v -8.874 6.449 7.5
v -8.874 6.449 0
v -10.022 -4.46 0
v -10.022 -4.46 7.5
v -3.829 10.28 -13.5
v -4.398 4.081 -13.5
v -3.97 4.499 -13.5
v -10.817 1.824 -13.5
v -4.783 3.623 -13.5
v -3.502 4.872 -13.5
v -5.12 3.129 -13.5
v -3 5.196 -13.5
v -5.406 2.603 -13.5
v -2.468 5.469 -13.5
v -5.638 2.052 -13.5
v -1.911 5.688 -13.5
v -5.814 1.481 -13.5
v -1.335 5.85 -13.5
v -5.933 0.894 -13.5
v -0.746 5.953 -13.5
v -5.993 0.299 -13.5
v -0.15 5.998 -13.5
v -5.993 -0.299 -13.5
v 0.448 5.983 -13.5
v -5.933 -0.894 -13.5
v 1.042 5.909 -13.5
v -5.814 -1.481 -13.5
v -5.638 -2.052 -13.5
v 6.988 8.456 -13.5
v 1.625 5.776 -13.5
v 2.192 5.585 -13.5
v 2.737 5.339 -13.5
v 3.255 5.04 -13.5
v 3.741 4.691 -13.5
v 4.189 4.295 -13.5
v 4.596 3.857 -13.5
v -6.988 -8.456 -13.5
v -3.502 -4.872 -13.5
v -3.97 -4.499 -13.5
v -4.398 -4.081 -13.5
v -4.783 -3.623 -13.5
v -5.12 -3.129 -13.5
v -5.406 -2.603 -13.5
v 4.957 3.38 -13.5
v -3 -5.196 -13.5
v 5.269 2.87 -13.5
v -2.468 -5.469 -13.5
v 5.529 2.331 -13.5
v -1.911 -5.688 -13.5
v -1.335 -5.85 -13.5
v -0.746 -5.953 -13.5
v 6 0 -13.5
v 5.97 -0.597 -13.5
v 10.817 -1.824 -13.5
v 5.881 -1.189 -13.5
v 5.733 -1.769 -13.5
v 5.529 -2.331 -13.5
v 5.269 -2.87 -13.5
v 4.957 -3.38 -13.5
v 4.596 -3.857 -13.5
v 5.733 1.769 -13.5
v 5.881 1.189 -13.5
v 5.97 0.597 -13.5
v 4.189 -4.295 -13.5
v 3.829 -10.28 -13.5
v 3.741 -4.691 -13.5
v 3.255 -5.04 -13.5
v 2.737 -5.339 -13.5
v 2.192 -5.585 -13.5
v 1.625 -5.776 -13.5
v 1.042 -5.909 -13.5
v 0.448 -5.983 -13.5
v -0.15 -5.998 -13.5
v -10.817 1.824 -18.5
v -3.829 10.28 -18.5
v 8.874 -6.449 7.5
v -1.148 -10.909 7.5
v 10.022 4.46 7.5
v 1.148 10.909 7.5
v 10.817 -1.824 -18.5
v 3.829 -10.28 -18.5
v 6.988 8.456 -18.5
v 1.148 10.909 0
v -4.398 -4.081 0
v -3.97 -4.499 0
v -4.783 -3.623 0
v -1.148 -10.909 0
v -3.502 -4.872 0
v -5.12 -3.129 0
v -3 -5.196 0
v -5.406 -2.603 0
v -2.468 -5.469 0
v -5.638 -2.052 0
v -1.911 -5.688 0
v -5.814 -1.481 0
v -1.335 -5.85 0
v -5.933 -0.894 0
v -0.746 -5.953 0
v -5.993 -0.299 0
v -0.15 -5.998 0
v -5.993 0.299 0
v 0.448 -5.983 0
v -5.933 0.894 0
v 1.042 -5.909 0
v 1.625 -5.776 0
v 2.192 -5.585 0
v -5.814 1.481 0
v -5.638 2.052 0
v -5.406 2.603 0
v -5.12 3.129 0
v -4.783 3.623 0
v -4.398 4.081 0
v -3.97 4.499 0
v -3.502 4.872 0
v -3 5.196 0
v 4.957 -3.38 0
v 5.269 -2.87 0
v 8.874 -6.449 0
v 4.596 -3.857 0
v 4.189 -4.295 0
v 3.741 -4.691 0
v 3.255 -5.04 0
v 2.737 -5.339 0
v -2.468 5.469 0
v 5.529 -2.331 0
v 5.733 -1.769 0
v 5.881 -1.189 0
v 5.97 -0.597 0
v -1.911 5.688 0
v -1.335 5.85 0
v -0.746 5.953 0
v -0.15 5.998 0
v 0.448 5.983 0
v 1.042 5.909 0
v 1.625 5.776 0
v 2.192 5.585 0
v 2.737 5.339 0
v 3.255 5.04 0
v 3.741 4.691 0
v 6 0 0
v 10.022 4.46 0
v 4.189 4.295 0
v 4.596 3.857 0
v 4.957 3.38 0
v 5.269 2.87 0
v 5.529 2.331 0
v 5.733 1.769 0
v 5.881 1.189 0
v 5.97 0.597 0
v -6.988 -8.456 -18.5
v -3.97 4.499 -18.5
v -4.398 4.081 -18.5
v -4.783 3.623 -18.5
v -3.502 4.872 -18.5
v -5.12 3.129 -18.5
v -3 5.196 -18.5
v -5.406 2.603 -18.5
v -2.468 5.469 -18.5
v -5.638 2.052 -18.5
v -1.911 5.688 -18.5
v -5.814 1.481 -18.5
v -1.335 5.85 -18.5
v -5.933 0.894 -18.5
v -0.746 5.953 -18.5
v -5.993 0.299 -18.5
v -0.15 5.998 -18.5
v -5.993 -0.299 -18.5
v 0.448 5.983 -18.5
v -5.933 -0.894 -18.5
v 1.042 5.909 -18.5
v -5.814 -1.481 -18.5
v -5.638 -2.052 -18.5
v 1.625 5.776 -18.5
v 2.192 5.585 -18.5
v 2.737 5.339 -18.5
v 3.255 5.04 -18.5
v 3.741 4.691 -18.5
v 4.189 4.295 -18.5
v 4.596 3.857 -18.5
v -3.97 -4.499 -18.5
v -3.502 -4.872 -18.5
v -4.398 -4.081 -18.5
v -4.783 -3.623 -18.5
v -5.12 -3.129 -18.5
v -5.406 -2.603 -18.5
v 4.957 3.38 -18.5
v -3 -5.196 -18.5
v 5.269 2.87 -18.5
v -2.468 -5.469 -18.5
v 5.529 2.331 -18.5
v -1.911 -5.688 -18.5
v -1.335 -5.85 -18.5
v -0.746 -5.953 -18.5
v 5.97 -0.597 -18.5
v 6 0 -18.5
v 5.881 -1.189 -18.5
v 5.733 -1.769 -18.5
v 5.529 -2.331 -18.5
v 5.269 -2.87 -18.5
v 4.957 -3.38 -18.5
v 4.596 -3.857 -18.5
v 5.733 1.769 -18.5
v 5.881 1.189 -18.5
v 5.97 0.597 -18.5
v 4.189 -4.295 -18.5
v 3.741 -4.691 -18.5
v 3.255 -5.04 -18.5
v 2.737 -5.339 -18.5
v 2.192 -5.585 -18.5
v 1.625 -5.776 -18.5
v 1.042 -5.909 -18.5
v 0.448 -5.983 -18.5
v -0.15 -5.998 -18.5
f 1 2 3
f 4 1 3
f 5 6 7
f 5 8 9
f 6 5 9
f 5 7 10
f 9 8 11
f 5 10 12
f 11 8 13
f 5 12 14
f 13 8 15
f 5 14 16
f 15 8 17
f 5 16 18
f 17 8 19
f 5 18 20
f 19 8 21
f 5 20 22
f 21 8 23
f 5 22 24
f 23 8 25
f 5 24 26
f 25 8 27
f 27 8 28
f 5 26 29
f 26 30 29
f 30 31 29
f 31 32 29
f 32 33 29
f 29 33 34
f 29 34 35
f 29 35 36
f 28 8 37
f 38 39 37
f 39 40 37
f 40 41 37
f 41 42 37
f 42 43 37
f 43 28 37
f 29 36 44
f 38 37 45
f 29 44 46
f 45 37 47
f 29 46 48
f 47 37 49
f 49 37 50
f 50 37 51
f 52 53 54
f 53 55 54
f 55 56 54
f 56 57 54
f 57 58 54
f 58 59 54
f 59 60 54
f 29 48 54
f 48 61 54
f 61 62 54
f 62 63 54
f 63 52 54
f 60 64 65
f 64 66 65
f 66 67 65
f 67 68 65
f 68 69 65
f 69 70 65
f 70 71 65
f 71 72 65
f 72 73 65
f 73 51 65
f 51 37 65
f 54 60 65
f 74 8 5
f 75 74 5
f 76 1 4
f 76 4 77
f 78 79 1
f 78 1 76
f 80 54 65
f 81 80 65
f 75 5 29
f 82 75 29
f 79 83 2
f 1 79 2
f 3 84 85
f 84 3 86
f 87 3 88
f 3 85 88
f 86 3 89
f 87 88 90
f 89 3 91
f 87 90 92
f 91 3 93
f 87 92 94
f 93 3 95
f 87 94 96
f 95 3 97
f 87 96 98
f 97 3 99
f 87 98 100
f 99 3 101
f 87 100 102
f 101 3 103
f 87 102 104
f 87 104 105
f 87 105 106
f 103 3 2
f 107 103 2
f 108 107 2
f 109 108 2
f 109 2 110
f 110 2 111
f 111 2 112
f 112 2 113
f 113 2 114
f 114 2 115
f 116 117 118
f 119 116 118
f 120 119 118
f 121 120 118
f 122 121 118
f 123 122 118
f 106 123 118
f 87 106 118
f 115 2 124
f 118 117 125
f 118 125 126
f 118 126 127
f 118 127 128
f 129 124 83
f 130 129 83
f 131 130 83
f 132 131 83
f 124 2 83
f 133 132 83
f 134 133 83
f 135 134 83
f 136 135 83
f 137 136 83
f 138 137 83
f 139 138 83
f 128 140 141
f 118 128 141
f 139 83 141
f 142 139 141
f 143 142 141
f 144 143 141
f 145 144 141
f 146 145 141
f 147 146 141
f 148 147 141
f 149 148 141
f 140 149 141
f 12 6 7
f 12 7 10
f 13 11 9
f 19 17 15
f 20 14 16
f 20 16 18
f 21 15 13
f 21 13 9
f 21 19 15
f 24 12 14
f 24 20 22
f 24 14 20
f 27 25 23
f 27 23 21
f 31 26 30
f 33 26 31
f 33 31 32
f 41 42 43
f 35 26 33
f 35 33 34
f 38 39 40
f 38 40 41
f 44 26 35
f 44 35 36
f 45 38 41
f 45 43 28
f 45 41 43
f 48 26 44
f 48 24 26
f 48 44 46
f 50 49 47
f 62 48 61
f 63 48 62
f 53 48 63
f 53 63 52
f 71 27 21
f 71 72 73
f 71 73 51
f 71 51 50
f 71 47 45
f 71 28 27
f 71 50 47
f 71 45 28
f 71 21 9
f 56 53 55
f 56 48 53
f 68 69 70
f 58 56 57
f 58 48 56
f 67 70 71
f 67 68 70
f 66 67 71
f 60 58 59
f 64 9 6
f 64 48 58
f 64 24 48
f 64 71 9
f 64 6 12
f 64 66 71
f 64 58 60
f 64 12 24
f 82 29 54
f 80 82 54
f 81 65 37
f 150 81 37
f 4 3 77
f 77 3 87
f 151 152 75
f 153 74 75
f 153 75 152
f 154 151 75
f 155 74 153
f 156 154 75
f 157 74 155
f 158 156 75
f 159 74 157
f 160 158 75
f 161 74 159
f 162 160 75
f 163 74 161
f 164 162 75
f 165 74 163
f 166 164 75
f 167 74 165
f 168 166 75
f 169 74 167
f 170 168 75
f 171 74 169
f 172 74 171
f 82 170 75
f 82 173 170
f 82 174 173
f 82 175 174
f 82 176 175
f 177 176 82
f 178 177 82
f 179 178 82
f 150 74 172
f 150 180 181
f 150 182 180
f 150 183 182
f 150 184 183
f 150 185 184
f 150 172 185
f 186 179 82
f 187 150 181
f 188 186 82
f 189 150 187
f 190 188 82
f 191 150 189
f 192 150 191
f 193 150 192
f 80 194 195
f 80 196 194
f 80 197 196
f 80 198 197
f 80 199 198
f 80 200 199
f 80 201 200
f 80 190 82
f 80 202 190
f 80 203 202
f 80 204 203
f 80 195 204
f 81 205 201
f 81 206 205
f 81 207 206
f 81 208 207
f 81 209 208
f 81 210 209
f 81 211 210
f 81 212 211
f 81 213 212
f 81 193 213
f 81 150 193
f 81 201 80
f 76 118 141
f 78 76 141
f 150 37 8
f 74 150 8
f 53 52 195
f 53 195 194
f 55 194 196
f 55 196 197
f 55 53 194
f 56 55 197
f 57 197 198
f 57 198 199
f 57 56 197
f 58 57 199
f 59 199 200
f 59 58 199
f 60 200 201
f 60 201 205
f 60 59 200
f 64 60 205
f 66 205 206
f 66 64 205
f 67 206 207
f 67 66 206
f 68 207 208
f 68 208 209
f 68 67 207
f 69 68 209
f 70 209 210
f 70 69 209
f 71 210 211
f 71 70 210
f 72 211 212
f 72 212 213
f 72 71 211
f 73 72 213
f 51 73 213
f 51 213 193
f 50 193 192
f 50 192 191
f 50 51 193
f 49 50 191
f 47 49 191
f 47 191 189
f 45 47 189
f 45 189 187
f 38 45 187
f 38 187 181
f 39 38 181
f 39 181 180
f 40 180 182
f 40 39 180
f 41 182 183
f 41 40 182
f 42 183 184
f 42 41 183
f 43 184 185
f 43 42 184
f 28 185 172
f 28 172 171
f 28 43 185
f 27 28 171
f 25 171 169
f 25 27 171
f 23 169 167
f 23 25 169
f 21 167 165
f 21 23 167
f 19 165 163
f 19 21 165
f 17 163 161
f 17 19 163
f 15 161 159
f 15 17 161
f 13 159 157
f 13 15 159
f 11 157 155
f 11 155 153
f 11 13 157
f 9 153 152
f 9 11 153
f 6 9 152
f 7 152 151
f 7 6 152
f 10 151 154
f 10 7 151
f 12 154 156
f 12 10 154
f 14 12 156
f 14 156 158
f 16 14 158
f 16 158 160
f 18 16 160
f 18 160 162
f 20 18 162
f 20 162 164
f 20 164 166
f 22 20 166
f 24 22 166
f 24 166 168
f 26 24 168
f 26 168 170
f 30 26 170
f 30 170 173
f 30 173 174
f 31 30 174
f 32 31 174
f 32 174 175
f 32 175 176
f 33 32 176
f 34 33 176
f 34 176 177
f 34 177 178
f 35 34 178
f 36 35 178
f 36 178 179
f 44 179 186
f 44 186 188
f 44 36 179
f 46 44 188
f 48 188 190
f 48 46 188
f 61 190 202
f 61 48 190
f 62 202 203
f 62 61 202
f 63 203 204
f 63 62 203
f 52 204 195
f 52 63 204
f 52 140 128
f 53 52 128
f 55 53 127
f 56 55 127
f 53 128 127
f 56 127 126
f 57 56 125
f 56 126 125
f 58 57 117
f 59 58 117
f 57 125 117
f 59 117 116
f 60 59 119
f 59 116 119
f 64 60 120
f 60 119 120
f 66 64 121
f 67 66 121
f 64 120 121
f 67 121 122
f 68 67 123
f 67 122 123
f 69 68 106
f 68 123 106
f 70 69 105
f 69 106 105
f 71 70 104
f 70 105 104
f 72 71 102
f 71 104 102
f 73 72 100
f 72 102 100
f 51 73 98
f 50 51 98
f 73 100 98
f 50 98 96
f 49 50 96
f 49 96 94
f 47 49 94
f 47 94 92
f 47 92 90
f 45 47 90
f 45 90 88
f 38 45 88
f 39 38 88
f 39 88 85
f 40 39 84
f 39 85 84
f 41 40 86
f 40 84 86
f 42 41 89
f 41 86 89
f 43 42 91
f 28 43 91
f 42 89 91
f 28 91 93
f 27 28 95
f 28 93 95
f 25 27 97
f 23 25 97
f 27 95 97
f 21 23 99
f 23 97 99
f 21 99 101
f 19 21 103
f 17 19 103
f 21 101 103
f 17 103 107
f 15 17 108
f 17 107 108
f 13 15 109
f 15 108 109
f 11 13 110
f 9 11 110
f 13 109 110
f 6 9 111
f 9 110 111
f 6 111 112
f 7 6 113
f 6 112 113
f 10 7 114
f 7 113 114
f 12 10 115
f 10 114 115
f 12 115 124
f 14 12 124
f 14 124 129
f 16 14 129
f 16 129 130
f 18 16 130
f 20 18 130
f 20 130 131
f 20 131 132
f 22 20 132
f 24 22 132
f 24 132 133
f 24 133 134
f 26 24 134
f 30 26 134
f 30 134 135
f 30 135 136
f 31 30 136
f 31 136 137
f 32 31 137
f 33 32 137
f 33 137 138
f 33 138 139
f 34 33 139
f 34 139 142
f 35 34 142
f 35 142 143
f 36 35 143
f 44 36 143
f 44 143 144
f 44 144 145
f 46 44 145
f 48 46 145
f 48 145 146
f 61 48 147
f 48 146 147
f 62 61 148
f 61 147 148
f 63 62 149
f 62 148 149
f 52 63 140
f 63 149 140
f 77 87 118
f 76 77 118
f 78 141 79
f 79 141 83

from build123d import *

# Parameters (mm, degrees)
F1_DEPTH = 7.5
F2_R     = 6
F3_DEPTH = 13.5
F4_R     = 6
F5_DEPTH = 5


with BuildPart() as f1:
    # F0 (on Top) → F1 (new body)
    with BuildSketch(Plane.XY):
        Polygon((-8.873624, 6.449196), (-10.02198, -4.460185), (-1.148356, -10.909382), (8.873624, -6.449196), (10.02198, 4.460185), (1.148356, 10.909382), align=None)
    extrude(amount=F1_DEPTH)

    # F2 (on face) → F3 (join)
    with BuildSketch(Plane(origin=(0, 0, 0), x_dir=(1, 0, 0), z_dir=(0, 0, -1))):
        Circle(F2_R)
    extrude(amount=F3_DEPTH)


with BuildPart() as f5:
    # F4 (on face) → F5 (new body)
    with BuildSketch(Plane(origin=(0, 0, -13.5), x_dir=(1, 0, 0), z_dir=(0, 0, -1))):
        Polygon((6.988092, -8.455761), (10.81695, 1.823985), (3.828858, 10.279746), (-6.988092, 8.455761), (-10.81695, -1.823985), (-3.828858, -10.279746), align=None)
        Circle(F4_R, mode=Mode.SUBTRACT)
    extrude(amount=F5_DEPTH)


solid = Compound([f1.part, f5.part])
